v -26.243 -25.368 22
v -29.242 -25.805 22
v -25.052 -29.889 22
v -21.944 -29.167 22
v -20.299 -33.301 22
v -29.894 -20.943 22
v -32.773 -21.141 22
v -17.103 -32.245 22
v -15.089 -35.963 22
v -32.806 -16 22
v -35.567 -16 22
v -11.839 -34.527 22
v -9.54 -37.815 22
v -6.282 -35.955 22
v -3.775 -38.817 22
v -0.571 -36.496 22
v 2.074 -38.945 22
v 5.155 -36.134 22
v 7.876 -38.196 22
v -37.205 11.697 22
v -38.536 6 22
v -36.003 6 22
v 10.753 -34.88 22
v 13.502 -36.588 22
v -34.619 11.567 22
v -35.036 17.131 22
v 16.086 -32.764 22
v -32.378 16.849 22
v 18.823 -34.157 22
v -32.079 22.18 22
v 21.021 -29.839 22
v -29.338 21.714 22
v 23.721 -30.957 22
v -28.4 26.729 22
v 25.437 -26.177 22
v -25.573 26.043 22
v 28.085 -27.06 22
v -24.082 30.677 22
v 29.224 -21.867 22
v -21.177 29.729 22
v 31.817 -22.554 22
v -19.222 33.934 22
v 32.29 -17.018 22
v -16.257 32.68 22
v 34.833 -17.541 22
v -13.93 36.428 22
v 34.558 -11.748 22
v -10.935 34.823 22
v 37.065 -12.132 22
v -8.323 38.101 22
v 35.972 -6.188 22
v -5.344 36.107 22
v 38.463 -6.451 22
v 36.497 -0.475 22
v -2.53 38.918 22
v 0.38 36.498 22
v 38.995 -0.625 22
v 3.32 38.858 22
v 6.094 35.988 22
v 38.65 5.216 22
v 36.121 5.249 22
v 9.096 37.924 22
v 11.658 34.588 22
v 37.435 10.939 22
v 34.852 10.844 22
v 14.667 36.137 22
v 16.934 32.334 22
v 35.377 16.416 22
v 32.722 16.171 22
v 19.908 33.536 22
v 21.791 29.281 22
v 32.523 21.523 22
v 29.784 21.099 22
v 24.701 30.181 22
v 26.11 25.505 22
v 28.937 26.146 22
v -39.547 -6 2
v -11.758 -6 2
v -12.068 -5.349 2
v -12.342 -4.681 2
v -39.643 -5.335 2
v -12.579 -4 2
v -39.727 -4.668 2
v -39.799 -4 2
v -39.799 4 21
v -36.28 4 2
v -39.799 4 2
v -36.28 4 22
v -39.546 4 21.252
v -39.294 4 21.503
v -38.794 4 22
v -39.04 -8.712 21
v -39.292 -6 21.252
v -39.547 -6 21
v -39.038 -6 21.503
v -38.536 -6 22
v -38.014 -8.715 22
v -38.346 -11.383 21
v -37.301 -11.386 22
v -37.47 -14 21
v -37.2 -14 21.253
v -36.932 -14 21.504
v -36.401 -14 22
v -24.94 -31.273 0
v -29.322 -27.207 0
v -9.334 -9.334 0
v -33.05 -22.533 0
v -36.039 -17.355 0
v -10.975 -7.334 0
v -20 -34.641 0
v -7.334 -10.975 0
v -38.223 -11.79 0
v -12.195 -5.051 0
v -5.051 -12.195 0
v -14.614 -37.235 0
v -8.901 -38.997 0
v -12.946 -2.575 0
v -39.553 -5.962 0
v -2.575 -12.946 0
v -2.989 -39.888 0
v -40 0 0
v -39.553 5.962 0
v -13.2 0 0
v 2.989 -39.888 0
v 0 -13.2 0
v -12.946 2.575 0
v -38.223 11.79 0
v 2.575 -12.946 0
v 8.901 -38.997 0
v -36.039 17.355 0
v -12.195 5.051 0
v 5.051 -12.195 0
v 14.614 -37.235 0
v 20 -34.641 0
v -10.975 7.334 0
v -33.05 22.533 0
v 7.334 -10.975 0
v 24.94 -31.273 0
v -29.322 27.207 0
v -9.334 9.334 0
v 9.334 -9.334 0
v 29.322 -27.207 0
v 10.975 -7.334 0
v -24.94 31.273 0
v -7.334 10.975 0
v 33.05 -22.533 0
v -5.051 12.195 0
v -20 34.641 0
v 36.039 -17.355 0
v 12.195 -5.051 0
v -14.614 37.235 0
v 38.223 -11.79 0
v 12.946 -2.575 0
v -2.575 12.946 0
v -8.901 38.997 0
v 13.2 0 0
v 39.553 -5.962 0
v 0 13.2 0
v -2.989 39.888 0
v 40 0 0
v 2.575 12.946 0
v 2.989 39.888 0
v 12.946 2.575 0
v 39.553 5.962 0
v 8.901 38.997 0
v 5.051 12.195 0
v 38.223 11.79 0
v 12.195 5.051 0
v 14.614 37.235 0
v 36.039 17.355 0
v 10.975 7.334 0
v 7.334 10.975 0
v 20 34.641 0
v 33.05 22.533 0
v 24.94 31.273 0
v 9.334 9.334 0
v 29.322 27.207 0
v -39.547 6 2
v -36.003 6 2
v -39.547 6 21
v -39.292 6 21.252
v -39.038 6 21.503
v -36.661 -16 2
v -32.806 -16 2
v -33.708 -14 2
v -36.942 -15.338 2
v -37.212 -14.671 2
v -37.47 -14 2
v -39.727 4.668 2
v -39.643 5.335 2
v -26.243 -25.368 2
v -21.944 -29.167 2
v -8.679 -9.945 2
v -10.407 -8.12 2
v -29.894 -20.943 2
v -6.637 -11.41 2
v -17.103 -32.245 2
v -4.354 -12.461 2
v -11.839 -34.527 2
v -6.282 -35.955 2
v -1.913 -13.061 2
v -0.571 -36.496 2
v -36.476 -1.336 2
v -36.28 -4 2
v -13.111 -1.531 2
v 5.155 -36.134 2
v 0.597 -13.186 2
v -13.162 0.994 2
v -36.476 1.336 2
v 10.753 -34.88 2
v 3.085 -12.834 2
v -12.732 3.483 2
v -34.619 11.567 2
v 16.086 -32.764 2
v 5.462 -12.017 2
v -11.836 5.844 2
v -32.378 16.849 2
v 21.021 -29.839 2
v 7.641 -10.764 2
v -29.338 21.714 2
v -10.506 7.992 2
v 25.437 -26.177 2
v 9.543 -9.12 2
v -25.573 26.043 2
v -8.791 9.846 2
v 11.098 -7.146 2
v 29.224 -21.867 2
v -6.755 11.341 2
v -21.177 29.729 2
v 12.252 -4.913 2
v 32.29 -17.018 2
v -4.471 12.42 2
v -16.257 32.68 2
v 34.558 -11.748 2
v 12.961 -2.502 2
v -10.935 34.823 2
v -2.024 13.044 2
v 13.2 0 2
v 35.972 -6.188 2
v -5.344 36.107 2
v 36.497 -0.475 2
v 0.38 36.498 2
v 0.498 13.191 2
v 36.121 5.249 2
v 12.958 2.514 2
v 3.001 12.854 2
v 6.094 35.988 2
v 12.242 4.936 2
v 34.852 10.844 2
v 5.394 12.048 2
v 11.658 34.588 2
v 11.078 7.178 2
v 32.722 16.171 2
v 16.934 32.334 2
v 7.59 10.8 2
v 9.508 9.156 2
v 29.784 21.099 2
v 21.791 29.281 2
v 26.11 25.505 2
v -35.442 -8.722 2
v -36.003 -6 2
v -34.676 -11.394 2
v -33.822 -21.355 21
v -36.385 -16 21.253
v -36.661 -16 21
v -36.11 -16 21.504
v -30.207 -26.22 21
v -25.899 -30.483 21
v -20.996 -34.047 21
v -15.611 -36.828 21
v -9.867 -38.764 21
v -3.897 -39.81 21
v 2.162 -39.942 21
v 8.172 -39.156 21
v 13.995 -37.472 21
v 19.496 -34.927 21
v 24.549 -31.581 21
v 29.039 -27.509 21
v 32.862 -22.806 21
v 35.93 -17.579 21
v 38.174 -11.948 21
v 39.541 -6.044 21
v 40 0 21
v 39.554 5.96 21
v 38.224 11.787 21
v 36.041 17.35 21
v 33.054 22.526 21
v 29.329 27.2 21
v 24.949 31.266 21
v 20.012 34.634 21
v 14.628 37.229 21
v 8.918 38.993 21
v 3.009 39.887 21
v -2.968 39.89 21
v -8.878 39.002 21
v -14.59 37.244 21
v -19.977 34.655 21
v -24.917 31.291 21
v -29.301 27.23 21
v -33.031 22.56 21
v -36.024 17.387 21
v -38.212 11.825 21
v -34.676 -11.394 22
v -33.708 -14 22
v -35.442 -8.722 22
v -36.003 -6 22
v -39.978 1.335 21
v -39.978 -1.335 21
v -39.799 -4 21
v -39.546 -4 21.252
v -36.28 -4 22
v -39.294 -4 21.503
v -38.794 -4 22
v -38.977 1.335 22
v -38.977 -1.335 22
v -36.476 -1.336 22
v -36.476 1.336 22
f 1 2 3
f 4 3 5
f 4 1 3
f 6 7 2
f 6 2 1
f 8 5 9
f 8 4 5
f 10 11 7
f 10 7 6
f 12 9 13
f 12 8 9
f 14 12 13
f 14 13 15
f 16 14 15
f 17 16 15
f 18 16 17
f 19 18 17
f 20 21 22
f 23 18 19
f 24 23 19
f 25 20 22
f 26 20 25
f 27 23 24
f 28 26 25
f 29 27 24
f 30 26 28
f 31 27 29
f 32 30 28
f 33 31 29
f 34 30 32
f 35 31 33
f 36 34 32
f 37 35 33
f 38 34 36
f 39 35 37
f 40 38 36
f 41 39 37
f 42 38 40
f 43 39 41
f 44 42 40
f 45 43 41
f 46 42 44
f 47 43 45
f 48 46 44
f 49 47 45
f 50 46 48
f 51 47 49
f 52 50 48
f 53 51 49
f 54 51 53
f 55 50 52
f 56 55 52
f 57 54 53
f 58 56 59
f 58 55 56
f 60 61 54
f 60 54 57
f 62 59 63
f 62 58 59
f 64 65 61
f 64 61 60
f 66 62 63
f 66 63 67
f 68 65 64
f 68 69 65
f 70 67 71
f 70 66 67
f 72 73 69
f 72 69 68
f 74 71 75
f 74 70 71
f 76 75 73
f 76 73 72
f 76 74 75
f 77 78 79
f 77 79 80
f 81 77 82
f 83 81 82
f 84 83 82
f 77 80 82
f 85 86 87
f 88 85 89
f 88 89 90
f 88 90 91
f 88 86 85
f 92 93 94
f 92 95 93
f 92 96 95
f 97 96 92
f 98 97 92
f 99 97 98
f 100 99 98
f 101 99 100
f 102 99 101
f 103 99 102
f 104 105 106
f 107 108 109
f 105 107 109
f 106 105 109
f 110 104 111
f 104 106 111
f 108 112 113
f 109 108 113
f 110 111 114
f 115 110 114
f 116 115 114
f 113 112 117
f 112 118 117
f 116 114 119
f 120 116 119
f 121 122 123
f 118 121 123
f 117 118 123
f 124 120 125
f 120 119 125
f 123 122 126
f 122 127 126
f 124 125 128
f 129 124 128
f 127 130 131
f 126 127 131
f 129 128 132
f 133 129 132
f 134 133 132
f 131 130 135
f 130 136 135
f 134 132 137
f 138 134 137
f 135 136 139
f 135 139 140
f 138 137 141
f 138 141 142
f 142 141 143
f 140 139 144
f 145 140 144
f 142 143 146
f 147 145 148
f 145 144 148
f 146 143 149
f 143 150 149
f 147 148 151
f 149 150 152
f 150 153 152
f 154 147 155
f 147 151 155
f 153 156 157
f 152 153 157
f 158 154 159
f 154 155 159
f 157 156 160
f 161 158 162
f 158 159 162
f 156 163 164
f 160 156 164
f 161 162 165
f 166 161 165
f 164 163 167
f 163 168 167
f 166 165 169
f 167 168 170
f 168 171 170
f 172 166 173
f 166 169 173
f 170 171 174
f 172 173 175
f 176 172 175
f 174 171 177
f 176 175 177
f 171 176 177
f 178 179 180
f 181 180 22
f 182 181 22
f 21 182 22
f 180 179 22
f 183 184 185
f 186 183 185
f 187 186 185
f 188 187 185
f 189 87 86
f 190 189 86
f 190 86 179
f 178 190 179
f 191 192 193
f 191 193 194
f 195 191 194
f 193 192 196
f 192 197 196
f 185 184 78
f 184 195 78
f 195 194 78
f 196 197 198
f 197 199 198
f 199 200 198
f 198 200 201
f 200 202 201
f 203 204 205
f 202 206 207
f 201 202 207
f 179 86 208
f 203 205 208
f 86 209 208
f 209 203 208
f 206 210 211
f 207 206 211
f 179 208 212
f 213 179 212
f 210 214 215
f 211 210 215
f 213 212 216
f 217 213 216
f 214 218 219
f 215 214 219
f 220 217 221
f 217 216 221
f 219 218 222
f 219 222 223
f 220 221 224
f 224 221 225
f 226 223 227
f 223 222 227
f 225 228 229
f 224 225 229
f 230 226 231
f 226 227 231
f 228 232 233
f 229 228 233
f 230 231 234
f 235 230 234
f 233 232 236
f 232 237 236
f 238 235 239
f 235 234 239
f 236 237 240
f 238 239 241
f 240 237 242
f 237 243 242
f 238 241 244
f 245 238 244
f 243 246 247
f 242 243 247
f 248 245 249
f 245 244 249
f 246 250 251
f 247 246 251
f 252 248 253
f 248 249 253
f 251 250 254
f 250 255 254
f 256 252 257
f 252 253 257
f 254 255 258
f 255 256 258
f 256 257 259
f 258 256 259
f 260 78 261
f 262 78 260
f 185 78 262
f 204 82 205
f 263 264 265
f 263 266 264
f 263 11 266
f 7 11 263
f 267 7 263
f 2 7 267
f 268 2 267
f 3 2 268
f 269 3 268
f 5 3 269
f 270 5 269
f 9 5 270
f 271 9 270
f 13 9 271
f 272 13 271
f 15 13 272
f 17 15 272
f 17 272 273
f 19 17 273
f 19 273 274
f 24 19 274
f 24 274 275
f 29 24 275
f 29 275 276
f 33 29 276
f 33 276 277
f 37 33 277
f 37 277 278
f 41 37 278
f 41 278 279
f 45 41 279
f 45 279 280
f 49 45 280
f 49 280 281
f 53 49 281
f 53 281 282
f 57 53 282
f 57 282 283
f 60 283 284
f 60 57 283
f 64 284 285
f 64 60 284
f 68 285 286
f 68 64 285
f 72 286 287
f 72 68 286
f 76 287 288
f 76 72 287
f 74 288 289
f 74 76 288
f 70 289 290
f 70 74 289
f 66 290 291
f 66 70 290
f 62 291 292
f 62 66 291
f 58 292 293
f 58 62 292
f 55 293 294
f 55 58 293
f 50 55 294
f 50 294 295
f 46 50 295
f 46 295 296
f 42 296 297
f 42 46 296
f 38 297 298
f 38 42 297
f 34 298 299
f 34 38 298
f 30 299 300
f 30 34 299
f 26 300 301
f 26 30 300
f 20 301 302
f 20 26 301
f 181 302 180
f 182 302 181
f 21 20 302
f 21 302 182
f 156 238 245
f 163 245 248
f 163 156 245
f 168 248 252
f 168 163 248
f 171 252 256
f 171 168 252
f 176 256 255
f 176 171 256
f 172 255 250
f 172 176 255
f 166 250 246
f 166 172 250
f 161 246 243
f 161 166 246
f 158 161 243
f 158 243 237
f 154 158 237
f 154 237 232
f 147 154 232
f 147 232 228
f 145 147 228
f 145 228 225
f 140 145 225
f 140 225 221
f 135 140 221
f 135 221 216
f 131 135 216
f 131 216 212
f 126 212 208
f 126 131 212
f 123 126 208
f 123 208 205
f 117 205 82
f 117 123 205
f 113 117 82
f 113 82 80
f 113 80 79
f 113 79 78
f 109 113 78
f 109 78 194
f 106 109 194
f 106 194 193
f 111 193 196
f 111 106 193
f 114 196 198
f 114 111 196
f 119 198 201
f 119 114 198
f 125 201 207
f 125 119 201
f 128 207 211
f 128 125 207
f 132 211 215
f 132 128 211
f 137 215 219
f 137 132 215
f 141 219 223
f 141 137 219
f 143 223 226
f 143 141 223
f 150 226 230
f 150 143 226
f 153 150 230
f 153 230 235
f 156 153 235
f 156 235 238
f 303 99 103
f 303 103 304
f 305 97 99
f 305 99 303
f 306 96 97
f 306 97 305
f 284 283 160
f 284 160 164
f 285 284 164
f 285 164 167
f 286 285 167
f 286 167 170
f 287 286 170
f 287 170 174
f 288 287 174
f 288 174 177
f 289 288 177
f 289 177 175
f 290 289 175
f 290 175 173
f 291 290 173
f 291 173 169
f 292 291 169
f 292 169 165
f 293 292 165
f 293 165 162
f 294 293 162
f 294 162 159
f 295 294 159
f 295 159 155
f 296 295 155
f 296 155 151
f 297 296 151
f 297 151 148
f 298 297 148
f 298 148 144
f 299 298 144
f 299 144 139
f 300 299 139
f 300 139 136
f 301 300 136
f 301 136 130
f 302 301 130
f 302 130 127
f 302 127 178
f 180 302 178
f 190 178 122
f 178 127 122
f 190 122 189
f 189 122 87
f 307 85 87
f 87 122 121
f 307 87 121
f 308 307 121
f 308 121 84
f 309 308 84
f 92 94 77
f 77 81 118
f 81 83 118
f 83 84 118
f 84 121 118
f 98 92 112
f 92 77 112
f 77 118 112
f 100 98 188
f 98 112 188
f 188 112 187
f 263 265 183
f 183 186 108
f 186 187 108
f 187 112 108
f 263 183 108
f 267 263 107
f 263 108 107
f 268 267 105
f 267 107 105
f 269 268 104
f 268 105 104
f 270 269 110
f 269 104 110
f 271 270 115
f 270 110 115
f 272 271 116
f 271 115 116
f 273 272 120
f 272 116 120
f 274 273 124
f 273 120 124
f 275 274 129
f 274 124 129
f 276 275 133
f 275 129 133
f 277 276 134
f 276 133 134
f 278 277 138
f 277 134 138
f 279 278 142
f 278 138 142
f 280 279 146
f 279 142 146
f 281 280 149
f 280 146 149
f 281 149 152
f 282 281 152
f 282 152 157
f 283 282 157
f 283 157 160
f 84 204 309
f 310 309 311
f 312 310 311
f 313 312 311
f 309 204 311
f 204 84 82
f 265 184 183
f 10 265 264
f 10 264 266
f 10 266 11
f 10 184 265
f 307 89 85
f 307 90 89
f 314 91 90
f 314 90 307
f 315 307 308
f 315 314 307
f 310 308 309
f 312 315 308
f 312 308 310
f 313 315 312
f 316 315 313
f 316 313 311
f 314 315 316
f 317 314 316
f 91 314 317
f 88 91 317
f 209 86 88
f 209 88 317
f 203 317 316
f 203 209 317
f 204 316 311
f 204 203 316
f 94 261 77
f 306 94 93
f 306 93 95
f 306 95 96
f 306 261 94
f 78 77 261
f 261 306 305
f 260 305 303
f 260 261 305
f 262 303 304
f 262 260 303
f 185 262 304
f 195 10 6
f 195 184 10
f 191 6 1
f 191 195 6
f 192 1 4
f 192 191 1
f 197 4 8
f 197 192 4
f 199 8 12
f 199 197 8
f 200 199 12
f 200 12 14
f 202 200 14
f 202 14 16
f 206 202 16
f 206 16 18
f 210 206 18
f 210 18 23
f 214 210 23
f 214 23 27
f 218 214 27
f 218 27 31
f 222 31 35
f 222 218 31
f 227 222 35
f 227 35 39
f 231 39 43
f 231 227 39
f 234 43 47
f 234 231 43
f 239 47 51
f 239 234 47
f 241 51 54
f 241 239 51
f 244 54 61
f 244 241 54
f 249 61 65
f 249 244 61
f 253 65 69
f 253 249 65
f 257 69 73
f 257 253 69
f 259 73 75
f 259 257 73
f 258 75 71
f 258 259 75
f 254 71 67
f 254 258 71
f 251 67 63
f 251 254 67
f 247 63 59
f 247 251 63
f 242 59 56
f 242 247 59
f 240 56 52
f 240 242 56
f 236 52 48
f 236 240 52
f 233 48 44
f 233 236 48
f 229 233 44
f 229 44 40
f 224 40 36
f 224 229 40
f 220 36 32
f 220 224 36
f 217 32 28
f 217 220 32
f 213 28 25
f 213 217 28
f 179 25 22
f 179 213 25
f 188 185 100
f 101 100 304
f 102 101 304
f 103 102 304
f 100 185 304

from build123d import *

# Parameters (mm, degrees)
SKETCH_R        = 40
SKETCH_R_2      = 13.2
PAD_DEPTH       = 2
SKETCH001_R     = 40
SKETCH001_R_2   = 36.5
PAD001_DEPTH    = 20
SKETCH002_W     = 2
SKETCH002_H     = 26.167402
SKETCH002_H_2   = 24.922537
SKETCH002_H_3   = 27.566788
POCKET_DEPTH    = 40.001
CHAMFER_SIZE    = 1
CHAMFER001_SIZE = 1
CHAMFER002_SIZE = 1


with BuildPart() as part:
    # Sketch → Pad (new body)
    with BuildSketch(Plane.XY):
        Circle(SKETCH_R)
        Circle(SKETCH_R_2, mode=Mode.SUBTRACT)
    extrude(amount=PAD_DEPTH)

    # Sketch001 (on Face4 of Pad) → Pad001 (join)
    with BuildSketch(Plane.XY.offset(2)):
        Circle(SKETCH001_R)
        Circle(SKETCH001_R_2, mode=Mode.SUBTRACT)
    extrude(amount=PAD001_DEPTH)

    # Sketch002 → Pocket (cut, through all)
    with BuildSketch(Plane.YZ):
        with Locations((5, 15.083701)):
            Rectangle(SKETCH002_W, SKETCH002_H)
        with Locations((-5, 14.461268)):
            Rectangle(SKETCH002_W, SKETCH002_H_2)
        with Locations((-15, 15.783394)):
            Rectangle(SKETCH002_W, SKETCH002_H_3)
    extrude(amount=-POCKET_DEPTH, mode=Mode.SUBTRACT)

    # Chamfer
    chamfer_edges = [part.edges().sort_by_distance(p)[0] for p in [
        (3.008522, 39.8867, 22),
    ]]
    chamfer(chamfer_edges, length=CHAMFER_SIZE)

    # Chamfer001
    chamfer001_edges = [part.edges().sort_by_distance(p)[0] for p in [
        (-40, 0, 22),
    ]]
    chamfer(chamfer001_edges, length=CHAMFER001_SIZE)

    # Chamfer002
    chamfer002_edges = [part.edges().sort_by_distance(p)[0] for p in [
        (-38.715902, -10.053803, 22),
    ]]
    chamfer(chamfer002_edges, length=CHAMFER002_SIZE)


solid = part.part
